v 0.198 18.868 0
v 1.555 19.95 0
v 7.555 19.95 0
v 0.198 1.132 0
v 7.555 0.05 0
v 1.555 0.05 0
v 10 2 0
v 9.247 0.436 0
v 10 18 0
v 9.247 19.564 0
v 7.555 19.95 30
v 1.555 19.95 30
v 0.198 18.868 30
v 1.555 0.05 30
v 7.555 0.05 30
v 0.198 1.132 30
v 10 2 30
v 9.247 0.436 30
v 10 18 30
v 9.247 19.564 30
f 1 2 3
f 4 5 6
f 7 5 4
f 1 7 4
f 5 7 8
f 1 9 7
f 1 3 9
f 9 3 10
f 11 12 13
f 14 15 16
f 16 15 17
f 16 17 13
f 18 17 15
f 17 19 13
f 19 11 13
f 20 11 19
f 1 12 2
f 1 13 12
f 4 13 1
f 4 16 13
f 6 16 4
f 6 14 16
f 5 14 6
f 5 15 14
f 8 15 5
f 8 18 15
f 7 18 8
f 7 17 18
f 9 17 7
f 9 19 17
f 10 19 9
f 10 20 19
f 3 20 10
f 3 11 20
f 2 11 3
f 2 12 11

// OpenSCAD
module cube_round(dim,mki=5,plane="xy"){
    if(mki<=0)
    {
        cube(dim);
    }
    else
    {
        if(plane=="xy")
        {
            translate([mki/2,mki/2,0])
            {
                linear_extrude(dim[2])
                {
                    minkowski()
                    {
                        square([dim[0]-mki,dim[1]-mki]);
                        circle(d=mki);
                    }
                }
            }
        }
        if(plane=="yz")
        {
            translate([0,mki/2,dim[2]-mki/2])
            {
                rotate([0,90,0])
                {
                    linear_extrude(dim[0])
                    {
                        minkowski()
                        {
                            square([dim[2]-mki,dim[1]-mki]);
                            circle(d=mki);
                        }
                    }
                }
            }
        }
        if(plane=="xz")
        {
            translate([mki/2,dim[1],mki/2])
            {
                rotate([90,0,0])
                {
                    linear_extrude(dim[1])
                    {
                        minkowski()
                        {
                            square([dim[0]-mki,dim[2]-mki]);
                            circle(d=mki);
                        }
                    }
                }
            }
        }
    }
}

cube_round([10,20,30],4,"xy");
